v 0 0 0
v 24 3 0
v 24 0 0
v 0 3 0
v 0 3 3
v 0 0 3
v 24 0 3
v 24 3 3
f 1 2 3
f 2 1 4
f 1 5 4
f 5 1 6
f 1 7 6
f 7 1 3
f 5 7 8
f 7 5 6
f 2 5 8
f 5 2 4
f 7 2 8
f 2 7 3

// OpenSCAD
union() {
    translate([0.0, 0.0, 0.0]) cube([1, 1, 1]);
    translate([0.0, 0.0, 1.0]) cube([1, 1, 1]);
    translate([0.0, 0.0, 2.0]) cube([1, 1, 1]);
    translate([0.0, 1.0, 0.0]) cube([1, 1, 1]);
    translate([0.0, 1.0, 1.0]) cube([1, 1, 1]);
    translate([0.0, 1.0, 2.0]) cube([1, 1, 1]);
    translate([0.0, 2.0, 0.0]) cube([1, 1, 1]);
    translate([0.0, 2.0, 1.0]) cube([1, 1, 1]);
    translate([0.0, 2.0, 2.0]) cube([1, 1, 1]);
    translate([1.0, 0.0, 0.0]) cube([1, 1, 1]);
    translate([1.0, 0.0, 1.0]) cube([1, 1, 1]);
    translate([1.0, 0.0, 2.0]) cube([1, 1, 1]);
    translate([1.0, 1.0, 0.0]) cube([1, 1, 1]);
    translate([1.0, 1.0, 1.0]) cube([1, 1, 1]);
    translate([1.0, 1.0, 2.0]) cube([1, 1, 1]);
    translate([1.0, 2.0, 0.0]) cube([1, 1, 1]);
    translate([1.0, 2.0, 1.0]) cube([1, 1, 1]);
    translate([1.0, 2.0, 2.0]) cube([1, 1, 1]);
    translate([2.0, 0.0, 0.0]) cube([1, 1, 1]);
    translate([2.0, 0.0, 1.0]) cube([1, 1, 1]);
    translate([2.0, 0.0, 2.0]) cube([1, 1, 1]);
    translate([2.0, 1.0, 0.0]) cube([1, 1, 1]);
    translate([2.0, 1.0, 1.0]) cube([1, 1, 1]);
    translate([2.0, 1.0, 2.0]) cube([1, 1, 1]);
    translate([2.0, 2.0, 0.0]) cube([1, 1, 1]);
    translate([2.0, 2.0, 1.0]) cube([1, 1, 1]);
    translate([2.0, 2.0, 2.0]) cube([1, 1, 1]);
    translate([3.0, 0.0, 0.0]) cube([1, 1, 1]);
    translate([3.0, 0.0, 1.0]) cube([1, 1, 1]);
    translate([3.0, 0.0, 2.0]) cube([1, 1, 1]);
    translate([3.0, 1.0, 0.0]) cube([1, 1, 1]);
    translate([3.0, 1.0, 1.0]) cube([1, 1, 1]);
    translate([3.0, 1.0, 2.0]) cube([1, 1, 1]);
    translate([3.0, 2.0, 0.0]) cube([1, 1, 1]);
    translate([3.0, 2.0, 1.0]) cube([1, 1, 1]);
    translate([3.0, 2.0, 2.0]) cube([1, 1, 1]);
    translate([4.0, 0.0, 0.0]) cube([1, 1, 1]);
    translate([4.0, 0.0, 1.0]) cube([1, 1, 1]);
    translate([4.0, 0.0, 2.0]) cube([1, 1, 1]);
    translate([4.0, 1.0, 0.0]) cube([1, 1, 1]);
    translate([4.0, 1.0, 1.0]) cube([1, 1, 1]);
    translate([4.0, 1.0, 2.0]) cube([1, 1, 1]);
    translate([4.0, 2.0, 0.0]) cube([1, 1, 1]);
    translate([4.0, 2.0, 1.0]) cube([1, 1, 1]);
    translate([4.0, 2.0, 2.0]) cube([1, 1, 1]);
    translate([5.0, 0.0, 0.0]) cube([1, 1, 1]);
    translate([5.0, 0.0, 1.0]) cube([1, 1, 1]);
    translate([5.0, 0.0, 2.0]) cube([1, 1, 1]);
    translate([5.0, 1.0, 0.0]) cube([1, 1, 1]);
    translate([5.0, 1.0, 1.0]) cube([1, 1, 1]);
    translate([5.0, 1.0, 2.0]) cube([1, 1, 1]);
    translate([5.0, 2.0, 0.0]) cube([1, 1, 1]);
    translate([5.0, 2.0, 1.0]) cube([1, 1, 1]);
    translate([5.0, 2.0, 2.0]) cube([1, 1, 1]);
    translate([6.0, 0.0, 0.0]) cube([1, 1, 1]);
    translate([6.0, 0.0, 1.0]) cube([1, 1, 1]);
    translate([6.0, 0.0, 2.0]) cube([1, 1, 1]);
    translate([6.0, 1.0, 0.0]) cube([1, 1, 1]);
    translate([6.0, 1.0, 1.0]) cube([1, 1, 1]);
    translate([6.0, 1.0, 2.0]) cube([1, 1, 1]);
    translate([6.0, 2.0, 0.0]) cube([1, 1, 1]);
    translate([6.0, 2.0, 1.0]) cube([1, 1, 1]);
    translate([6.0, 2.0, 2.0]) cube([1, 1, 1]);
    translate([7.0, 0.0, 0.0]) cube([1, 1, 1]);
    translate([7.0, 0.0, 1.0]) cube([1, 1, 1]);
    translate([7.0, 0.0, 2.0]) cube([1, 1, 1]);
    translate([7.0, 1.0, 0.0]) cube([1, 1, 1]);
    translate([7.0, 1.0, 1.0]) cube([1, 1, 1]);
    translate([7.0, 1.0, 2.0]) cube([1, 1, 1]);
    translate([7.0, 2.0, 0.0]) cube([1, 1, 1]);
    translate([7.0, 2.0, 1.0]) cube([1, 1, 1]);
    translate([7.0, 2.0, 2.0]) cube([1, 1, 1]);
    translate([8.0, 0.0, 0.0]) cube([1, 1, 1]);
    translate([8.0, 0.0, 1.0]) cube([1, 1, 1]);
    translate([8.0, 0.0, 2.0]) cube([1, 1, 1]);
    translate([8.0, 1.0, 0.0]) cube([1, 1, 1]);
    translate([8.0, 1.0, 1.0]) cube([1, 1, 1]);
    translate([8.0, 1.0, 2.0]) cube([1, 1, 1]);
    translate([8.0, 2.0, 0.0]) cube([1, 1, 1]);
    translate([8.0, 2.0, 1.0]) cube([1, 1, 1]);
    translate([8.0, 2.0, 2.0]) cube([1, 1, 1]);
    translate([9.0, 0.0, 0.0]) cube([1, 1, 1]);
    translate([9.0, 0.0, 1.0]) cube([1, 1, 1]);
    translate([9.0, 0.0, 2.0]) cube([1, 1, 1]);
    translate([9.0, 1.0, 0.0]) cube([1, 1, 1]);
    translate([9.0, 1.0, 1.0]) cube([1, 1, 1]);
    translate([9.0, 1.0, 2.0]) cube([1, 1, 1]);
    translate([9.0, 2.0, 0.0]) cube([1, 1, 1]);
    translate([9.0, 2.0, 1.0]) cube([1, 1, 1]);
    translate([9.0, 2.0, 2.0]) cube([1, 1, 1]);
    translate([10.0, 0.0, 0.0]) cube([1, 1, 1]);
    translate([10.0, 0.0, 1.0]) cube([1, 1, 1]);
    translate([10.0, 0.0, 2.0]) cube([1, 1, 1]);
    translate([10.0, 1.0, 0.0]) cube([1, 1, 1]);
    translate([10.0, 1.0, 1.0]) cube([1, 1, 1]);
    translate([10.0, 1.0, 2.0]) cube([1, 1, 1]);
    translate([10.0, 2.0, 0.0]) cube([1, 1, 1]);
    translate([10.0, 2.0, 1.0]) cube([1, 1, 1]);
    translate([10.0, 2.0, 2.0]) cube([1, 1, 1]);
    translate([11.0, 0.0, 0.0]) cube([1, 1, 1]);
    translate([11.0, 0.0, 1.0]) cube([1, 1, 1]);
    translate([11.0, 0.0, 2.0]) cube([1, 1, 1]);
    translate([11.0, 1.0, 0.0]) cube([1, 1, 1]);
    translate([11.0, 1.0, 1.0]) cube([1, 1, 1]);
    translate([11.0, 1.0, 2.0]) cube([1, 1, 1]);
    translate([11.0, 2.0, 0.0]) cube([1, 1, 1]);
    translate([11.0, 2.0, 1.0]) cube([1, 1, 1]);
    translate([11.0, 2.0, 2.0]) cube([1, 1, 1]);
    translate([12.0, 0.0, 0.0]) cube([1, 1, 1]);
    translate([12.0, 0.0, 1.0]) cube([1, 1, 1]);
    translate([12.0, 0.0, 2.0]) cube([1, 1, 1]);
    translate([12.0, 1.0, 0.0]) cube([1, 1, 1]);
    translate([12.0, 1.0, 1.0]) cube([1, 1, 1]);
    translate([12.0, 1.0, 2.0]) cube([1, 1, 1]);
    translate([12.0, 2.0, 0.0]) cube([1, 1, 1]);
    translate([12.0, 2.0, 1.0]) cube([1, 1, 1]);
    translate([12.0, 2.0, 2.0]) cube([1, 1, 1]);
    translate([13.0, 0.0, 0.0]) cube([1, 1, 1]);
    translate([13.0, 0.0, 1.0]) cube([1, 1, 1]);
    translate([13.0, 0.0, 2.0]) cube([1, 1, 1]);
    translate([13.0, 1.0, 0.0]) cube([1, 1, 1]);
    translate([13.0, 1.0, 1.0]) cube([1, 1, 1]);
    translate([13.0, 1.0, 2.0]) cube([1, 1, 1]);
    translate([13.0, 2.0, 0.0]) cube([1, 1, 1]);
    translate([13.0, 2.0, 1.0]) cube([1, 1, 1]);
    translate([13.0, 2.0, 2.0]) cube([1, 1, 1]);
    translate([14.0, 0.0, 0.0]) cube([1, 1, 1]);
    translate([14.0, 0.0, 1.0]) cube([1, 1, 1]);
    translate([14.0, 0.0, 2.0]) cube([1, 1, 1]);
    translate([14.0, 1.0, 0.0]) cube([1, 1, 1]);
    translate([14.0, 1.0, 1.0]) cube([1, 1, 1]);
    translate([14.0, 1.0, 2.0]) cube([1, 1, 1]);
    translate([14.0, 2.0, 0.0]) cube([1, 1, 1]);
    translate([14.0, 2.0, 1.0]) cube([1, 1, 1]);
    translate([14.0, 2.0, 2.0]) cube([1, 1, 1]);
    translate([15.0, 0.0, 0.0]) cube([1, 1, 1]);
    translate([15.0, 0.0, 1.0]) cube([1, 1, 1]);
    translate([15.0, 0.0, 2.0]) cube([1, 1, 1]);
    translate([15.0, 1.0, 0.0]) cube([1, 1, 1]);
    translate([15.0, 1.0, 1.0]) cube([1, 1, 1]);
    translate([15.0, 1.0, 2.0]) cube([1, 1, 1]);
    translate([15.0, 2.0, 0.0]) cube([1, 1, 1]);
    translate([15.0, 2.0, 1.0]) cube([1, 1, 1]);
    translate([15.0, 2.0, 2.0]) cube([1, 1, 1]);
    translate([16.0, 0.0, 0.0]) cube([1, 1, 1]);
    translate([16.0, 0.0, 1.0]) cube([1, 1, 1]);
    translate([16.0, 0.0, 2.0]) cube([1, 1, 1]);
    translate([16.0, 1.0, 0.0]) cube([1, 1, 1]);
    translate([16.0, 1.0, 1.0]) cube([1, 1, 1]);
    translate([16.0, 1.0, 2.0]) cube([1, 1, 1]);
    translate([16.0, 2.0, 0.0]) cube([1, 1, 1]);
    translate([16.0, 2.0, 1.0]) cube([1, 1, 1]);
    translate([16.0, 2.0, 2.0]) cube([1, 1, 1]);
    translate([17.0, 0.0, 0.0]) cube([1, 1, 1]);
    translate([17.0, 0.0, 1.0]) cube([1, 1, 1]);
    translate([17.0, 0.0, 2.0]) cube([1, 1, 1]);
    translate([17.0, 1.0, 0.0]) cube([1, 1, 1]);
    translate([17.0, 1.0, 1.0]) cube([1, 1, 1]);
    translate([17.0, 1.0, 2.0]) cube([1, 1, 1]);
    translate([17.0, 2.0, 0.0]) cube([1, 1, 1]);
    translate([17.0, 2.0, 1.0]) cube([1, 1, 1]);
    translate([17.0, 2.0, 2.0]) cube([1, 1, 1]);
    translate([18.0, 0.0, 0.0]) cube([1, 1, 1]);
    translate([18.0, 0.0, 1.0]) cube([1, 1, 1]);
    translate([18.0, 0.0, 2.0]) cube([1, 1, 1]);
    translate([18.0, 1.0, 0.0]) cube([1, 1, 1]);
    translate([18.0, 1.0, 1.0]) cube([1, 1, 1]);
    translate([18.0, 1.0, 2.0]) cube([1, 1, 1]);
    translate([18.0, 2.0, 0.0]) cube([1, 1, 1]);
    translate([18.0, 2.0, 1.0]) cube([1, 1, 1]);
    translate([18.0, 2.0, 2.0]) cube([1, 1, 1]);
    translate([19.0, 0.0, 0.0]) cube([1, 1, 1]);
    translate([19.0, 0.0, 1.0]) cube([1, 1, 1]);
    translate([19.0, 0.0, 2.0]) cube([1, 1, 1]);
    translate([19.0, 1.0, 0.0]) cube([1, 1, 1]);
    translate([19.0, 1.0, 1.0]) cube([1, 1, 1]);
    translate([19.0, 1.0, 2.0]) cube([1, 1, 1]);
    translate([19.0, 2.0, 0.0]) cube([1, 1, 1]);
    translate([19.0, 2.0, 1.0]) cube([1, 1, 1]);
    translate([19.0, 2.0, 2.0]) cube([1, 1, 1]);
    translate([20.0, 0.0, 0.0]) cube([1, 1, 1]);
    translate([20.0, 0.0, 1.0]) cube([1, 1, 1]);
    translate([20.0, 0.0, 2.0]) cube([1, 1, 1]);
    translate([20.0, 1.0, 0.0]) cube([1, 1, 1]);
    translate([20.0, 1.0, 1.0]) cube([1, 1, 1]);
    translate([20.0, 1.0, 2.0]) cube([1, 1, 1]);
    translate([20.0, 2.0, 0.0]) cube([1, 1, 1]);
    translate([20.0, 2.0, 1.0]) cube([1, 1, 1]);
    translate([20.0, 2.0, 2.0]) cube([1, 1, 1]);
    translate([21.0, 0.0, 0.0]) cube([1, 1, 1]);
    translate([21.0, 0.0, 1.0]) cube([1, 1, 1]);
    translate([21.0, 0.0, 2.0]) cube([1, 1, 1]);
    translate([21.0, 1.0, 0.0]) cube([1, 1, 1]);
    translate([21.0, 1.0, 1.0]) cube([1, 1, 1]);
    translate([21.0, 1.0, 2.0]) cube([1, 1, 1]);
    translate([21.0, 2.0, 0.0]) cube([1, 1, 1]);
    translate([21.0, 2.0, 1.0]) cube([1, 1, 1]);
    translate([21.0, 2.0, 2.0]) cube([1, 1, 1]);
    translate([22.0, 0.0, 0.0]) cube([1, 1, 1]);
    translate([22.0, 0.0, 1.0]) cube([1, 1, 1]);
    translate([22.0, 0.0, 2.0]) cube([1, 1, 1]);
    translate([22.0, 1.0, 0.0]) cube([1, 1, 1]);
    translate([22.0, 1.0, 1.0]) cube([1, 1, 1]);
    translate([22.0, 1.0, 2.0]) cube([1, 1, 1]);
    translate([22.0, 2.0, 0.0]) cube([1, 1, 1]);
    translate([22.0, 2.0, 1.0]) cube([1, 1, 1]);
    translate([22.0, 2.0, 2.0]) cube([1, 1, 1]);
    translate([23.0, 0.0, 0.0]) cube([1, 1, 1]);
    translate([23.0, 0.0, 1.0]) cube([1, 1, 1]);
    translate([23.0, 0.0, 2.0]) cube([1, 1, 1]);
    translate([23.0, 1.0, 0.0]) cube([1, 1, 1]);
    translate([23.0, 1.0, 1.0]) cube([1, 1, 1]);
    translate([23.0, 1.0, 2.0]) cube([1, 1, 1]);
    translate([23.0, 2.0, 0.0]) cube([1, 1, 1]);
    translate([23.0, 2.0, 1.0]) cube([1, 1, 1]);
    translate([23.0, 2.0, 2.0]) cube([1, 1, 1]);
}
